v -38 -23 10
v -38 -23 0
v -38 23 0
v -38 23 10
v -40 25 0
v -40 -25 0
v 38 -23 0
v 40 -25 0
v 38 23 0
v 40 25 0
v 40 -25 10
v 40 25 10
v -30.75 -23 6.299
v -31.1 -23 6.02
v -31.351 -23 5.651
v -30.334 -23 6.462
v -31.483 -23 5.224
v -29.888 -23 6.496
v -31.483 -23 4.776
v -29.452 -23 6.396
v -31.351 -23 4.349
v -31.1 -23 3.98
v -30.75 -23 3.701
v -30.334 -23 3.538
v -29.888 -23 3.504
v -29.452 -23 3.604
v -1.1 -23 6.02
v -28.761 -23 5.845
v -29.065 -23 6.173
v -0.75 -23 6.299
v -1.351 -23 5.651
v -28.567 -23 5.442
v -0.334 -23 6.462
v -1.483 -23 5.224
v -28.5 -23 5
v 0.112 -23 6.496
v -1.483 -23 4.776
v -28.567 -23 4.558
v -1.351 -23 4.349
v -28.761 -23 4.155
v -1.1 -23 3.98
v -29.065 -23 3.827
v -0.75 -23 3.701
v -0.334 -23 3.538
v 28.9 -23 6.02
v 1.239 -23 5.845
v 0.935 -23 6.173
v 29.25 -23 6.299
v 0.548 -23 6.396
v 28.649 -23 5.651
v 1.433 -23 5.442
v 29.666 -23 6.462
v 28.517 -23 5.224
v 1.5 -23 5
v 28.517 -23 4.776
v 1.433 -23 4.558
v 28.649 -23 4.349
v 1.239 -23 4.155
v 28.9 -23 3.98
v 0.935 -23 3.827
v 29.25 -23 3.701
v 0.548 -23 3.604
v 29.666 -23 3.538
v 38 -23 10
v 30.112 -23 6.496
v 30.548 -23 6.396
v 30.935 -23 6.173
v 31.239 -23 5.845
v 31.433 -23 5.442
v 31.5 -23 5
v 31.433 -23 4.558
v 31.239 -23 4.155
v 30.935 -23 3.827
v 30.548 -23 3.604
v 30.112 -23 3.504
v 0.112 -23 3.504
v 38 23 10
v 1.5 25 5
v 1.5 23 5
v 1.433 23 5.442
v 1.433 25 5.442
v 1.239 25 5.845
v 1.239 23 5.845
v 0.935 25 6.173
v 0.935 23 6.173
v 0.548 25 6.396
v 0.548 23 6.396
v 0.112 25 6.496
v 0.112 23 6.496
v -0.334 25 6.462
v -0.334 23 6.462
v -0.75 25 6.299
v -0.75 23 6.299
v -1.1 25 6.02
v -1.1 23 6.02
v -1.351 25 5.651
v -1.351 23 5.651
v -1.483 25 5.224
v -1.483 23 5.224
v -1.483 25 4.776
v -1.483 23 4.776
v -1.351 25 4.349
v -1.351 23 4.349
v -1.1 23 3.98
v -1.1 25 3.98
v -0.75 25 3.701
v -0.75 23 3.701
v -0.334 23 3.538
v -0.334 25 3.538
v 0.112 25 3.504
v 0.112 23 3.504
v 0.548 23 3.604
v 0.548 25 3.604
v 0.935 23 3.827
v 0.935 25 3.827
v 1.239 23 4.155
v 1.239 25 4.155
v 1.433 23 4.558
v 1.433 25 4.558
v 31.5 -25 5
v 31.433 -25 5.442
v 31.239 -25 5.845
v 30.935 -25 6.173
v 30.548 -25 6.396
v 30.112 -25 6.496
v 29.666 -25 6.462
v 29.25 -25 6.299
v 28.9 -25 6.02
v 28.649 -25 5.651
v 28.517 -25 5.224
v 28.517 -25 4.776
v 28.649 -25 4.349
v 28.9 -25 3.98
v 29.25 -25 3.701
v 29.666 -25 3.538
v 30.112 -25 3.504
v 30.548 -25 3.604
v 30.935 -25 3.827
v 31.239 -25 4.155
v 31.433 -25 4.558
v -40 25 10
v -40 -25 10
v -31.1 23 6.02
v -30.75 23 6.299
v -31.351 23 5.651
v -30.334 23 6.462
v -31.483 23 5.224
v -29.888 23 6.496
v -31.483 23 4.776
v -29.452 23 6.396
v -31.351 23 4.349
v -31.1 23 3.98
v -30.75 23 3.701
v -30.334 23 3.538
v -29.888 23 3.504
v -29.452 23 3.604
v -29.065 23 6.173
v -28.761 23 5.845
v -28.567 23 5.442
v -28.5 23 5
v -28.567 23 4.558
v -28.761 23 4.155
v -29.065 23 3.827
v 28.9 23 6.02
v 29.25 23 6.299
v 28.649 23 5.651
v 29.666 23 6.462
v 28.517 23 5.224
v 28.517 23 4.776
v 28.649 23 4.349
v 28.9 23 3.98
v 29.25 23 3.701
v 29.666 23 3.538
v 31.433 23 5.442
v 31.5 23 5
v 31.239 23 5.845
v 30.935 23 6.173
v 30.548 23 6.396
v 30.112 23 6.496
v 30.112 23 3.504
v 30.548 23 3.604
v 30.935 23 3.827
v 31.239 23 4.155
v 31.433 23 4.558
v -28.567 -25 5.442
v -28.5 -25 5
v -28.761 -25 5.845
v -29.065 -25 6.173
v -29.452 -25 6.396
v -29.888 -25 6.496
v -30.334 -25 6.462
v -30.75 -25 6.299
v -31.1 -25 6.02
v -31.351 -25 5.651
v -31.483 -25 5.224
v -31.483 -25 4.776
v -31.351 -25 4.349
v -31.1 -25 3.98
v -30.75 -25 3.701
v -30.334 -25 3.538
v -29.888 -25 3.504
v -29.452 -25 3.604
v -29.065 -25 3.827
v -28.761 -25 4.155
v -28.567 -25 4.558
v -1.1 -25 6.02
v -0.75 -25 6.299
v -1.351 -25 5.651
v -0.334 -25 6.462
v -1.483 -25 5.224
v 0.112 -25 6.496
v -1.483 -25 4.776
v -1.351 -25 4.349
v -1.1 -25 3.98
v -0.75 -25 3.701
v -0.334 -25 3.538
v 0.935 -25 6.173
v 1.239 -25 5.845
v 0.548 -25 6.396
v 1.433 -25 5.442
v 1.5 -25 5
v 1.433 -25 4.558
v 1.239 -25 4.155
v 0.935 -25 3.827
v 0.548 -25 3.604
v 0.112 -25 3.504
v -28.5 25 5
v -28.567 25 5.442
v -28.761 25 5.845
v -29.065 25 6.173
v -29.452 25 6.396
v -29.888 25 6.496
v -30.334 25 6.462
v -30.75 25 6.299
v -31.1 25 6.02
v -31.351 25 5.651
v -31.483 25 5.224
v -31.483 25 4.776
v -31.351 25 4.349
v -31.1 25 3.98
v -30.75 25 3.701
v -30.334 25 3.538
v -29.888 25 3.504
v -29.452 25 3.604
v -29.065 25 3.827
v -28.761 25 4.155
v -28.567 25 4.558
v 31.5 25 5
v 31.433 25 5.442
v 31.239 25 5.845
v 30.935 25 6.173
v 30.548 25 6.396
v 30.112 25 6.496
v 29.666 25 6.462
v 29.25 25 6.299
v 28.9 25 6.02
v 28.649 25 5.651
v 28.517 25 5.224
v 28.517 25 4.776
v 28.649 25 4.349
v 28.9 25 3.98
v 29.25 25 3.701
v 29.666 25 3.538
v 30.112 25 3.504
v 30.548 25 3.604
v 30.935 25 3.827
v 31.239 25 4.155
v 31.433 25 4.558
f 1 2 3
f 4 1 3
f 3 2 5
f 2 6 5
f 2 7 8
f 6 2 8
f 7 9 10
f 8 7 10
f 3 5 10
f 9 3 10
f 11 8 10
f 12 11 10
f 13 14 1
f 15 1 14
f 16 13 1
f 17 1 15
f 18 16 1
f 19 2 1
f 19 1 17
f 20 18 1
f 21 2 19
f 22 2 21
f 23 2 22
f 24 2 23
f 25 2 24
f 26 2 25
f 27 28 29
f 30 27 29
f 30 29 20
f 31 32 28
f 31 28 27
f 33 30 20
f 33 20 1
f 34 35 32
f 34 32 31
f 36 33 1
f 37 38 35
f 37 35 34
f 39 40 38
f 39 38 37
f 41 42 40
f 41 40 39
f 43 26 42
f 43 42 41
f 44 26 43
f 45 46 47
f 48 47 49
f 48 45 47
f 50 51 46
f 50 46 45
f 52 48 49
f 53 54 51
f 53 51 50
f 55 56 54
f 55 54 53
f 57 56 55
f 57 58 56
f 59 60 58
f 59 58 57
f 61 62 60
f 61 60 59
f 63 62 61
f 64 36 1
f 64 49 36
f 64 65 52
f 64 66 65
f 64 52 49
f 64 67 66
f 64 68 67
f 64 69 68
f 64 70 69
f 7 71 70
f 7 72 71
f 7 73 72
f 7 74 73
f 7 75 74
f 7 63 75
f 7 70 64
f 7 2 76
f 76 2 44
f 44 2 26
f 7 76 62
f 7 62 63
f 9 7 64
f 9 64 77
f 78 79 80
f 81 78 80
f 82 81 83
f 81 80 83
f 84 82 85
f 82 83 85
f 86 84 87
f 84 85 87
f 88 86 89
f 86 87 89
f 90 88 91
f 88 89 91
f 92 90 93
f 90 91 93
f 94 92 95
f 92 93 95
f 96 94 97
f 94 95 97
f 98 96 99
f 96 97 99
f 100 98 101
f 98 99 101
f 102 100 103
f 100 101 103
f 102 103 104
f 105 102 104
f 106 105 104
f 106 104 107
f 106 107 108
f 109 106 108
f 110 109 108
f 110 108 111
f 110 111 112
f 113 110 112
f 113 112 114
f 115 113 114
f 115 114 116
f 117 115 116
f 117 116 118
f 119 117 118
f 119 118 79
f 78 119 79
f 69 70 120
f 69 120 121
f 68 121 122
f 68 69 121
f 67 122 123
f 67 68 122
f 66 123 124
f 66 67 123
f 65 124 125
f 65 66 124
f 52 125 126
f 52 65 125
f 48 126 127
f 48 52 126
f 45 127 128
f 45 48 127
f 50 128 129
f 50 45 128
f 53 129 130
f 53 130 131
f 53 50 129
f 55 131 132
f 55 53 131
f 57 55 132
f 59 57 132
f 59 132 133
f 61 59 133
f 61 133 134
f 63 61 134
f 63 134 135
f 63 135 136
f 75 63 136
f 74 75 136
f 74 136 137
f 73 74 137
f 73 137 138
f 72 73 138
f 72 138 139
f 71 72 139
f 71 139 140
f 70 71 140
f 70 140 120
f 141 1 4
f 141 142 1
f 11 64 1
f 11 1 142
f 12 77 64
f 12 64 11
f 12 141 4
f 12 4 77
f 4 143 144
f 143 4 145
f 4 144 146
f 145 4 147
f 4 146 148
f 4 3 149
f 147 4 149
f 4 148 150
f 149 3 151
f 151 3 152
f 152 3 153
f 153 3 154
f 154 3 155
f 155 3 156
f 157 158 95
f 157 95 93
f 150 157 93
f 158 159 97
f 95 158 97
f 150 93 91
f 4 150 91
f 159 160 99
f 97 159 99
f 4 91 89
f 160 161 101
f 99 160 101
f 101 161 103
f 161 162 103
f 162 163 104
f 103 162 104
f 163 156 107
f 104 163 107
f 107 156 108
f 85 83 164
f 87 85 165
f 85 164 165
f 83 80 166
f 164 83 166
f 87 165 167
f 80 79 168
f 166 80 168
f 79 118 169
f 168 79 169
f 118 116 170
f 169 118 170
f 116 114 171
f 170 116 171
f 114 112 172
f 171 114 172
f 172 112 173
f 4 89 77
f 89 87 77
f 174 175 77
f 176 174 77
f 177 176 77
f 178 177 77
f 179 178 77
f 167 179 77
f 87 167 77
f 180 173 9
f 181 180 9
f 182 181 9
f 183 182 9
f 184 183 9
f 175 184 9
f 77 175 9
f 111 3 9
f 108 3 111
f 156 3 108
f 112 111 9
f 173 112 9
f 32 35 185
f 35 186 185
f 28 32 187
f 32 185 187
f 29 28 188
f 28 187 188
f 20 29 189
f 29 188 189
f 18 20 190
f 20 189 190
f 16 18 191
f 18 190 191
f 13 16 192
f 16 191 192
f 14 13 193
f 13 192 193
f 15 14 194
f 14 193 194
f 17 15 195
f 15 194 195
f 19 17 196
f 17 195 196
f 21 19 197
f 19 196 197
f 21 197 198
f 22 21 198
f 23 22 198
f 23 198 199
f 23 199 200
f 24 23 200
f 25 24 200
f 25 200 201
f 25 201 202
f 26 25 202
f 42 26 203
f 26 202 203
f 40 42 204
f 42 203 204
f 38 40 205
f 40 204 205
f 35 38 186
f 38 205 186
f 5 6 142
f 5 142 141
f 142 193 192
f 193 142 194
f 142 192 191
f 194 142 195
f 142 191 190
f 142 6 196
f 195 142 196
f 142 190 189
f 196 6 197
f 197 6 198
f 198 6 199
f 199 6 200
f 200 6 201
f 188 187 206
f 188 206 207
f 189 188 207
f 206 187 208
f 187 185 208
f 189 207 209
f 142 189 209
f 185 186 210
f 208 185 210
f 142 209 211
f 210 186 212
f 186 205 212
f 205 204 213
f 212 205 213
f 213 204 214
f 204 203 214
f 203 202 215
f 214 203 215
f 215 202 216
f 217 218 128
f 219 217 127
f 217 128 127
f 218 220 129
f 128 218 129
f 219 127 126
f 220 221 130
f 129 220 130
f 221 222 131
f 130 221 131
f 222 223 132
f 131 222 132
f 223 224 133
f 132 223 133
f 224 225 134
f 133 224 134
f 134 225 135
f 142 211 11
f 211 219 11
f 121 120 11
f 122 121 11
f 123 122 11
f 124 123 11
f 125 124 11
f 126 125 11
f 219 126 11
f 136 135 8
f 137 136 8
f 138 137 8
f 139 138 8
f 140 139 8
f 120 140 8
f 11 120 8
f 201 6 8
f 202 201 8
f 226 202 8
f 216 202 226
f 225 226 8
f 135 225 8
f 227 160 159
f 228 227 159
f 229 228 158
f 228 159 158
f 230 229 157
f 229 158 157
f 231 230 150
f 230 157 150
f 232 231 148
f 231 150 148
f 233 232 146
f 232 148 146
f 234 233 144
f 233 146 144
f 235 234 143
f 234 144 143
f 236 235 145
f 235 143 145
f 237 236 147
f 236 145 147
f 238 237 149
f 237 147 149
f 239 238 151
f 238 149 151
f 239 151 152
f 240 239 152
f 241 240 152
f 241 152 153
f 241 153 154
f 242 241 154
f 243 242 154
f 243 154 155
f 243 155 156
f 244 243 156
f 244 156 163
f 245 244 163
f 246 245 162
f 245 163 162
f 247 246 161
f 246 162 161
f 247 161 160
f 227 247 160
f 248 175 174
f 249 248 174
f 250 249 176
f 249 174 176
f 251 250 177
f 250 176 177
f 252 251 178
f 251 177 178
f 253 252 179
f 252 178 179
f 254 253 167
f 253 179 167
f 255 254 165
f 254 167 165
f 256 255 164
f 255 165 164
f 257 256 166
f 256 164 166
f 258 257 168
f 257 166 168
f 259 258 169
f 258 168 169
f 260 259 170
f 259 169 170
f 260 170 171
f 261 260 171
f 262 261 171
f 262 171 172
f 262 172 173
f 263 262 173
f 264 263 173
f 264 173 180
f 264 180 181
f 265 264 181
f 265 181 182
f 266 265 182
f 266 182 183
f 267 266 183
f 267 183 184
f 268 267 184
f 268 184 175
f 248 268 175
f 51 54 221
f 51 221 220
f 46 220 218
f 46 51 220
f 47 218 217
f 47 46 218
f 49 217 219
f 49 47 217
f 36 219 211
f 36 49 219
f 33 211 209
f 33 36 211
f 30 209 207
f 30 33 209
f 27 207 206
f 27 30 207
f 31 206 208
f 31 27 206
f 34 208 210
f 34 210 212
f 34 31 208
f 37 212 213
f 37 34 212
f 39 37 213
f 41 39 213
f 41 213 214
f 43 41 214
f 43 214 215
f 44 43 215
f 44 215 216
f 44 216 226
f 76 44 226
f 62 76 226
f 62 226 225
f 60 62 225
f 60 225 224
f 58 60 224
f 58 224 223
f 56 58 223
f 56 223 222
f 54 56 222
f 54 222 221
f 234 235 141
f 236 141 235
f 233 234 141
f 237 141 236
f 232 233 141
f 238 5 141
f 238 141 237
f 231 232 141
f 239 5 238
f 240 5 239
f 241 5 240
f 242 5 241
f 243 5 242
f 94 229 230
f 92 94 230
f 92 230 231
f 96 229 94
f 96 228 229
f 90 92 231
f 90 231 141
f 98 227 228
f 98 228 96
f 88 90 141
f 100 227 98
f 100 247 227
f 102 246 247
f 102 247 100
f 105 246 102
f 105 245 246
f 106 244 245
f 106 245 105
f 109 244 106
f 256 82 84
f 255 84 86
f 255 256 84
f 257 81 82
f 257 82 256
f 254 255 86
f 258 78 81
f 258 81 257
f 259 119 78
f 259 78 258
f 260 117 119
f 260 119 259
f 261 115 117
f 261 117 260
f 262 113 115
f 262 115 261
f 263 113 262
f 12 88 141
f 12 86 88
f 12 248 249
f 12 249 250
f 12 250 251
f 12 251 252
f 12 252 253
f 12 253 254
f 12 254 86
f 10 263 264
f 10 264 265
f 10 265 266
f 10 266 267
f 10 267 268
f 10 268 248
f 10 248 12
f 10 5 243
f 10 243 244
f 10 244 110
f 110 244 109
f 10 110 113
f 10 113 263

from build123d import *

# Parameters (mm, degrees)
F0_W     = 80
F0_H     = 50
F1_DEPTH = 10
F2_T     = -2
F3_R     = 1.5
F4_DEPTH = 25


with BuildPart() as f1:
    # F0 (on Top) → F1 (new body)
    with BuildSketch(Plane.XY):
        Rectangle(F0_W, F0_H)
    extrude(amount=F1_DEPTH)

    # F2
    f2_openings = [f1.faces().sort_by_distance(p)[0] for p in [
        (0, 0, 10),
        (0, 0, 0),
    ]]
    offset(amount=F2_T, openings=f2_openings)

    # F3 (on Front) → F4 (cut, symmetric)
    with BuildSketch(Plane.XZ):
        with Locations((0, 5)):
            Circle(F3_R)
        with Locations((30, 5)):
            Circle(F3_R)
        with Locations((-30, 5)):
            Circle(F3_R)
    extrude(amount=F4_DEPTH, both=True, mode=Mode.SUBTRACT)


solid = f1.part
